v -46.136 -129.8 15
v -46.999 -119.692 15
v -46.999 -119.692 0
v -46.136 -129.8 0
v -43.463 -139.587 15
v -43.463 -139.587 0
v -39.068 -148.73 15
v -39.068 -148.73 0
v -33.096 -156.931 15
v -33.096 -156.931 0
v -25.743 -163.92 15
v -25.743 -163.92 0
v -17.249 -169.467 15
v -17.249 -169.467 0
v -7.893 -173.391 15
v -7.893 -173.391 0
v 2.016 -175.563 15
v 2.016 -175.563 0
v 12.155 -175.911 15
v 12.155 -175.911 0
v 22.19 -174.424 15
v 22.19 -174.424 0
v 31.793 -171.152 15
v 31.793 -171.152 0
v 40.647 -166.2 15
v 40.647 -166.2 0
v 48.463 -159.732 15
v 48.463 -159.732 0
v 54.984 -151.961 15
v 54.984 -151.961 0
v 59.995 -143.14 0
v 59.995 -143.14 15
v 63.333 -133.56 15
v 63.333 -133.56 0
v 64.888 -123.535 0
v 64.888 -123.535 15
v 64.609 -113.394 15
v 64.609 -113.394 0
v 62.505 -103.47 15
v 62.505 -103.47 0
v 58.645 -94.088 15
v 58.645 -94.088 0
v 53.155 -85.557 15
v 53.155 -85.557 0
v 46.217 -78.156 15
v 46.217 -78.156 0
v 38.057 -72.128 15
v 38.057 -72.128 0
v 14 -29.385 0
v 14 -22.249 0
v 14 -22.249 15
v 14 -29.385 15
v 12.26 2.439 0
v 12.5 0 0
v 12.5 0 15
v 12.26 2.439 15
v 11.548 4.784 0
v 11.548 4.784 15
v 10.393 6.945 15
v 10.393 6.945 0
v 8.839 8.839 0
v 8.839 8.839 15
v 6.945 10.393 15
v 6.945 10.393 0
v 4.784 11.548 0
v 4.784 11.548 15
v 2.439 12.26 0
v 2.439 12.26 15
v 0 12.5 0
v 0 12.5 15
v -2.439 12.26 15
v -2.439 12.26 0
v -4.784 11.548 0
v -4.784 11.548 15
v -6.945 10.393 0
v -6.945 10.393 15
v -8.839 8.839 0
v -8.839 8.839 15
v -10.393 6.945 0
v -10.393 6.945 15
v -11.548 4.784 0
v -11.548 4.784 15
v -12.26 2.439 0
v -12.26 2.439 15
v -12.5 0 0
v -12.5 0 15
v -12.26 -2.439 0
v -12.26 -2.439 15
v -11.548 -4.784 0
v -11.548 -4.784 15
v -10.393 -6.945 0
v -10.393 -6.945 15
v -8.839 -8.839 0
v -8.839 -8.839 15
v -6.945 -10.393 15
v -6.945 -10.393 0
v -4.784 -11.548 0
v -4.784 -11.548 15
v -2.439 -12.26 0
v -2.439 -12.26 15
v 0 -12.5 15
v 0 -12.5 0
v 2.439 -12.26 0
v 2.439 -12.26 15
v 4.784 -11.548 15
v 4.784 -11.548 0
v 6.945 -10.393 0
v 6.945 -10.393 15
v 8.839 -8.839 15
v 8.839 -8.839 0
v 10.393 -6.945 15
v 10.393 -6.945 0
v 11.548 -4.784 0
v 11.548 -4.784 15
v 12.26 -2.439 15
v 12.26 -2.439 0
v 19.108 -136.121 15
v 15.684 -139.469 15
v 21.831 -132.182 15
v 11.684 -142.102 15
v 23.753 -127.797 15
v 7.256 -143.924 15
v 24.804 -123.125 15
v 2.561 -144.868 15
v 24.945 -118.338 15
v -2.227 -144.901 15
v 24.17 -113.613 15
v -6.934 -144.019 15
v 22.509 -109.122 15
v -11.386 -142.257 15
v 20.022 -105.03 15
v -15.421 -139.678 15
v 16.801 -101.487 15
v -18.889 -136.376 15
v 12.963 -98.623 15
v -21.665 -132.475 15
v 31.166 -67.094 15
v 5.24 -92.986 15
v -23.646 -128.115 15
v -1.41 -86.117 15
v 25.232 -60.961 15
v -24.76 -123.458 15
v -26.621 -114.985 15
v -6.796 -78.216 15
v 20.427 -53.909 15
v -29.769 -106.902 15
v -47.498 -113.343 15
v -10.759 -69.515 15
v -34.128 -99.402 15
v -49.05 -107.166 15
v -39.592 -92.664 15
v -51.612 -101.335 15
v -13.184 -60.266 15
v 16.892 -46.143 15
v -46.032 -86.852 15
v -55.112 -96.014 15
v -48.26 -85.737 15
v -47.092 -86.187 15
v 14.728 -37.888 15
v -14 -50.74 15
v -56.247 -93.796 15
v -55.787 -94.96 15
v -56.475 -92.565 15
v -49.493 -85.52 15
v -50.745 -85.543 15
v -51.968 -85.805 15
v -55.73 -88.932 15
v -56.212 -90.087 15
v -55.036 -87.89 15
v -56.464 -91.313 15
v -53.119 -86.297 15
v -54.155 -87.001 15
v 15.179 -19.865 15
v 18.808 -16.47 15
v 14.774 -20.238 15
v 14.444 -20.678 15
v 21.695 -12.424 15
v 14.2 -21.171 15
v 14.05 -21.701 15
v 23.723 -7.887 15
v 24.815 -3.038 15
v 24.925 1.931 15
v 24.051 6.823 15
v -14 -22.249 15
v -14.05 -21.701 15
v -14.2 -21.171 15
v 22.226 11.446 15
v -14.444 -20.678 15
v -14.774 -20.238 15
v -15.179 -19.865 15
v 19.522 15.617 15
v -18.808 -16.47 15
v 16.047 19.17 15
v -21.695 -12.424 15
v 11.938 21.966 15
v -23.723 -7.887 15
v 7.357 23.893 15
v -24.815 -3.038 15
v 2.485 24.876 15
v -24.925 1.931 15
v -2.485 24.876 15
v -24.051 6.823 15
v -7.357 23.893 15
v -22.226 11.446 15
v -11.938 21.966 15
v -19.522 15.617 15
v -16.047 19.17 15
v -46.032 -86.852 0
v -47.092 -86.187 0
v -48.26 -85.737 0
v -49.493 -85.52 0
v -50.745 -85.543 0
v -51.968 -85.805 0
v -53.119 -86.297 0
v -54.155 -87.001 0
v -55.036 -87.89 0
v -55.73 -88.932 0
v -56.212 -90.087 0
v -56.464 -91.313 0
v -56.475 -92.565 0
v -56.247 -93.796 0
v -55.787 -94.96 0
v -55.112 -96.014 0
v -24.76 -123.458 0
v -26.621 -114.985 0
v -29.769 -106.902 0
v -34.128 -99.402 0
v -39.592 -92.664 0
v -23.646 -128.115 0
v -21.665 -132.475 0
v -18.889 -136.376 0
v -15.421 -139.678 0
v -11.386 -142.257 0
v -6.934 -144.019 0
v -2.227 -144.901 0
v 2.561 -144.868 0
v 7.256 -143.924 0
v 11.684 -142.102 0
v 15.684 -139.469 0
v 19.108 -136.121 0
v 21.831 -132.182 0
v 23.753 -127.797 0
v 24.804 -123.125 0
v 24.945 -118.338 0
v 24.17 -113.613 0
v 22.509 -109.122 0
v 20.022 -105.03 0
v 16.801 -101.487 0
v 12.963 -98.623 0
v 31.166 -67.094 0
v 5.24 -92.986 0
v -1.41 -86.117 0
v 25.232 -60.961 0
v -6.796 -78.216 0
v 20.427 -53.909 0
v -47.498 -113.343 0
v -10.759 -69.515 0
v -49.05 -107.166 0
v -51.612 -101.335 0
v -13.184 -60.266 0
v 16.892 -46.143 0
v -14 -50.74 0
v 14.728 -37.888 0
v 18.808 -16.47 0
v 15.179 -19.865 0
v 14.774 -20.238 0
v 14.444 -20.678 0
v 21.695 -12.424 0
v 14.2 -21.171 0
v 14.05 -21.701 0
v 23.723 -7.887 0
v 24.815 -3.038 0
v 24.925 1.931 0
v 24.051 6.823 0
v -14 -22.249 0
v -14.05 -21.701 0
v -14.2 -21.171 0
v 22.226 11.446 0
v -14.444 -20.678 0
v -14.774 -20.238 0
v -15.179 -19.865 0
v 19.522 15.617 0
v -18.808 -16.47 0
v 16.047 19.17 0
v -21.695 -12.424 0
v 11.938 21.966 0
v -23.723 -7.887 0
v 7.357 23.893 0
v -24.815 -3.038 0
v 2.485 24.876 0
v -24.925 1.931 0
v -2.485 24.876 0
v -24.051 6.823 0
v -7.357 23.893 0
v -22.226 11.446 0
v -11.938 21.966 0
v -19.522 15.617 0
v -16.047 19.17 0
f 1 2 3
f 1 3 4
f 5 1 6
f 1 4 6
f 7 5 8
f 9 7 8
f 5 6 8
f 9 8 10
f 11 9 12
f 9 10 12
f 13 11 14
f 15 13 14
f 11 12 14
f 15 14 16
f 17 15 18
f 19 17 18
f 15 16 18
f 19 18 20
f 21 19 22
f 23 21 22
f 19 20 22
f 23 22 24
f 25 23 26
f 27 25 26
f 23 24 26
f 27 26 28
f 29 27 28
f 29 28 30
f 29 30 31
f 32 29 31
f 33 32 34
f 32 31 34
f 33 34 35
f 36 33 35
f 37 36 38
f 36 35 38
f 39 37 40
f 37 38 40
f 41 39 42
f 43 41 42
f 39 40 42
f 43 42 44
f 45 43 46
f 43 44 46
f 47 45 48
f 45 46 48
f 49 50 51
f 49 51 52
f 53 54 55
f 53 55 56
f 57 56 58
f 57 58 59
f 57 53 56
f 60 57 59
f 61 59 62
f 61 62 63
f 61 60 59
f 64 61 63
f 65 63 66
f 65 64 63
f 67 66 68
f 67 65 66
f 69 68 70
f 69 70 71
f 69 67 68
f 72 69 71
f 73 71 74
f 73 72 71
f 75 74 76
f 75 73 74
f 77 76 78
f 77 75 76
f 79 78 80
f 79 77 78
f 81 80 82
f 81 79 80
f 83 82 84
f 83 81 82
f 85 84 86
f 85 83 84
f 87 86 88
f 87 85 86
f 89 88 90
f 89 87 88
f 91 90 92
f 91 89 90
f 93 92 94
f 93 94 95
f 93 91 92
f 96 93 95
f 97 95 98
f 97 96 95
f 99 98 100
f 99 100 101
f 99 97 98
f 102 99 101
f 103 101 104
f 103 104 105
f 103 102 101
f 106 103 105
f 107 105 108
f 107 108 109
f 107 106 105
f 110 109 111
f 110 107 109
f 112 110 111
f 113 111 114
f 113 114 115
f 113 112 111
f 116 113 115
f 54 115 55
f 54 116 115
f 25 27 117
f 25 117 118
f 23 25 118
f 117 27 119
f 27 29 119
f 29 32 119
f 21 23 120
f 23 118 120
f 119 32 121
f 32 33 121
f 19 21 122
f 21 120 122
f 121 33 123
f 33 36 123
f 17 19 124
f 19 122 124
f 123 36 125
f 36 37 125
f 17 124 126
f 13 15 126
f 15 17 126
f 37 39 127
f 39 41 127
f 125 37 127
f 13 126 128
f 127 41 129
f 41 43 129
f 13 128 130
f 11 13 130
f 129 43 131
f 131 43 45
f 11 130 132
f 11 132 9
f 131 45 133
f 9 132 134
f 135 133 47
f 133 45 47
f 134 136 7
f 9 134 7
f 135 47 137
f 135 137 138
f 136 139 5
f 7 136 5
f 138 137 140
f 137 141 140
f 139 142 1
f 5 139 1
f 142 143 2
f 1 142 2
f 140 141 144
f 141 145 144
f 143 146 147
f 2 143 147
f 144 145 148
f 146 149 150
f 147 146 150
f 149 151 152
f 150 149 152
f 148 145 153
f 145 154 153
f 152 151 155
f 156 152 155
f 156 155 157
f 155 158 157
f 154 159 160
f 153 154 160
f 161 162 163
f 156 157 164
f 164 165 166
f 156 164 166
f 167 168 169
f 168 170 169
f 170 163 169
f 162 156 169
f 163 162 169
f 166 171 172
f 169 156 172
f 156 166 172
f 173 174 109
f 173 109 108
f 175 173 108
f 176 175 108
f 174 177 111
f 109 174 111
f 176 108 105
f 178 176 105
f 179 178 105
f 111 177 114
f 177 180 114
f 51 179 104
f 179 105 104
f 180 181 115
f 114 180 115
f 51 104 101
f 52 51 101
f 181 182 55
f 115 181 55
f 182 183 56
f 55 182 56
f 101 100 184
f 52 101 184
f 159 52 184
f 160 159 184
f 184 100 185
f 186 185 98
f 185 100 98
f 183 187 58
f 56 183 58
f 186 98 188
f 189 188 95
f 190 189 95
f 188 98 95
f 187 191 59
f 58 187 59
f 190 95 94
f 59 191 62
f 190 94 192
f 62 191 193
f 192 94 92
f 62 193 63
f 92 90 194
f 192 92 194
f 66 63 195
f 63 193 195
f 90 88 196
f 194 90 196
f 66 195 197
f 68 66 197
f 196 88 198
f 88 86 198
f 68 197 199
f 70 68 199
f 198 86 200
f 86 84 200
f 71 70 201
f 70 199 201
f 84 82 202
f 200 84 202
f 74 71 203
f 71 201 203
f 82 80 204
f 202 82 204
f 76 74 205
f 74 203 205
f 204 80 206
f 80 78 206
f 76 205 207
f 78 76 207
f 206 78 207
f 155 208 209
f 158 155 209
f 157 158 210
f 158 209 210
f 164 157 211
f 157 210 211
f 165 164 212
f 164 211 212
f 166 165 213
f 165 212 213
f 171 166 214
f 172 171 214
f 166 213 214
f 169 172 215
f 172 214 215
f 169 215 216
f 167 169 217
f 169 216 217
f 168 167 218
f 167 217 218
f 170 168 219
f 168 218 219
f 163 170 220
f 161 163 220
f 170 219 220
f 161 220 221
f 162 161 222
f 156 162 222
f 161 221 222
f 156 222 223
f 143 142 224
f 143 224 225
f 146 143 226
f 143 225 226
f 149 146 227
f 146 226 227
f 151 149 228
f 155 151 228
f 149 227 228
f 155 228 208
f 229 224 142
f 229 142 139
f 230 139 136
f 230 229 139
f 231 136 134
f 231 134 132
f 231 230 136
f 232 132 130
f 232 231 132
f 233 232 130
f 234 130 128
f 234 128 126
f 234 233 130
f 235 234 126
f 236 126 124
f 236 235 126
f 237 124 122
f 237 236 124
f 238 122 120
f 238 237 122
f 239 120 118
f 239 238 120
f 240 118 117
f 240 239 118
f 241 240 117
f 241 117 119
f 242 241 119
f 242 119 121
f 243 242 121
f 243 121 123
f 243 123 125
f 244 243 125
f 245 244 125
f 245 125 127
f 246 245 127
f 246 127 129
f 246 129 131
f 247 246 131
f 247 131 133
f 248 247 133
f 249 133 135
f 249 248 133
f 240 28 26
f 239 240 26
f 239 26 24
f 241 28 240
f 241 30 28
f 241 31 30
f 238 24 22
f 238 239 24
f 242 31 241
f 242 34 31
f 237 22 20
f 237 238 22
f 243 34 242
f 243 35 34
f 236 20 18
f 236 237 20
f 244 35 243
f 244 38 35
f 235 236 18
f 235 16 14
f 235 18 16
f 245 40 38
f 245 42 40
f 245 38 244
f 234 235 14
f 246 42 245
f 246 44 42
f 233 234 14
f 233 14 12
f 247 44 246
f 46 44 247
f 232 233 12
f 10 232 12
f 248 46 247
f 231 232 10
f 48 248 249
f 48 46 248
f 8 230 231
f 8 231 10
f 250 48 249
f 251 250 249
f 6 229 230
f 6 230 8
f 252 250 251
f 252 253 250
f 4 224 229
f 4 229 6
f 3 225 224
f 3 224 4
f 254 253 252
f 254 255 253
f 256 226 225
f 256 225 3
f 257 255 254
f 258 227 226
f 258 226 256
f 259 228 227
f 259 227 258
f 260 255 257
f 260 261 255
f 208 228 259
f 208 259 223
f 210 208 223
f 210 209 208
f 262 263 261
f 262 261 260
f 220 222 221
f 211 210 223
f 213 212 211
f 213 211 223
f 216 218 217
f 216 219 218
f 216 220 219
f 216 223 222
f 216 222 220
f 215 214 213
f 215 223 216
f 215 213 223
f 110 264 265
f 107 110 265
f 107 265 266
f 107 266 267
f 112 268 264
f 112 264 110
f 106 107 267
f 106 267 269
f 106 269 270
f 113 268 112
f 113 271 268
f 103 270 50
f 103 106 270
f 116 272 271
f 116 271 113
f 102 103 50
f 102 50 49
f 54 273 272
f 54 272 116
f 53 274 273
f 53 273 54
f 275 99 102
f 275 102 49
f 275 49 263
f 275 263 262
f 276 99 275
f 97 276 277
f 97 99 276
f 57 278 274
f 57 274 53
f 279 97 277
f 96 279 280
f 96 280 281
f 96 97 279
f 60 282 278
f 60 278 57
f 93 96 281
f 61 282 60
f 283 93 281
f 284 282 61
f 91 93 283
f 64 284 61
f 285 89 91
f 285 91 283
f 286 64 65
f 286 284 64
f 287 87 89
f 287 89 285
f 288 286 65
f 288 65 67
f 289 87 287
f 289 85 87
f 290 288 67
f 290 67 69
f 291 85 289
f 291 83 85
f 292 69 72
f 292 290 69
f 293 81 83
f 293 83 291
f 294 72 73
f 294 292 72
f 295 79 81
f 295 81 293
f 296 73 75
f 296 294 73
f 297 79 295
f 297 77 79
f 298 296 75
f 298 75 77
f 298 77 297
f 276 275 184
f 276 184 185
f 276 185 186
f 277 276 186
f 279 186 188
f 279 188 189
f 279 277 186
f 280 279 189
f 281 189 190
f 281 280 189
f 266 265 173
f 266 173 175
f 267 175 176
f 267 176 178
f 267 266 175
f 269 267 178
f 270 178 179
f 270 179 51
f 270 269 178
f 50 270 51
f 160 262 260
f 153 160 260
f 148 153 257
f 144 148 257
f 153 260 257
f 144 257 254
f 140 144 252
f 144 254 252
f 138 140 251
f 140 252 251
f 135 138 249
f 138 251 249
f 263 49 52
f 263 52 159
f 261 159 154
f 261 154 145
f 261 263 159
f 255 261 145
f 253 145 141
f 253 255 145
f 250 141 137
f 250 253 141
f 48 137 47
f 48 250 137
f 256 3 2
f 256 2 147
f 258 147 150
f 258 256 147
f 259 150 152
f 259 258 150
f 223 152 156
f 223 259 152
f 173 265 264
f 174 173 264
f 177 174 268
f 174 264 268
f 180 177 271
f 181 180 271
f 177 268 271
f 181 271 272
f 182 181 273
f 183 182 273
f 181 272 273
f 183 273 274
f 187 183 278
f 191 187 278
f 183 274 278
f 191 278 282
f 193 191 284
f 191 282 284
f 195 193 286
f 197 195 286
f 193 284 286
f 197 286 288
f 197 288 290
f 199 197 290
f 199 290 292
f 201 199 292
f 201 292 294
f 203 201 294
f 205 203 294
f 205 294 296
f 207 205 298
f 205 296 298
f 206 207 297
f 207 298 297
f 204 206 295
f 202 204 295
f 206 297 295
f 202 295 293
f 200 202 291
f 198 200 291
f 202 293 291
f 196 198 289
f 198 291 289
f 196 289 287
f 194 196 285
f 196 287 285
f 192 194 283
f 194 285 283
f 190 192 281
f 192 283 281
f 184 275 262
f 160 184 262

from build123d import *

# Parameters (mm, degrees)
SKETCH_R  = 12.5
PAD_DEPTH = 15


with BuildPart() as part:
    # Sketch → Pad (new body)
    with BuildSketch(Plane.XY):
        with BuildLine():
            ThreePointArc((-24.759708, -123.457867), (13.746972, -140.88111), (12.962963, -98.62334))
            ThreePointArc((-14, -50.739622), (-6.795871, -78.216211), (12.962963, -98.62334))
            Line((-14, -22.248595), (-14, -50.739622))
            ThreePointArc((-14, -22.248595), (-14.310736, -20.918988), (-15.178571, -19.864817))
            ThreePointArc((15.178571, -19.864817), (0, 25), (-15.178571, -19.864817))
            ThreePointArc((15.178571, -19.864817), (14.310736, -20.918988), (14, -22.248595))
            Line((14, -22.248595), (14, -29.385432))
            ThreePointArc((14, -29.385432), (20.427246, -53.909198), (38.056604, -72.128153))
            ThreePointArc((-46.999155, -119.692368), (36.33247, -168.876744), (38.056604, -72.128153))
            ThreePointArc((-46.999155, -119.692368), (-49.050241, -107.16628), (-55.112152, -96.014461))
            ThreePointArc((-46.031526, -86.852067), (-54.616749, -87.424453), (-55.112152, -96.014461))
            ThreePointArc((-24.759708, -123.457867), (-31.802947, -103.067248), (-46.031526, -86.852067))
        make_face()
        Circle(SKETCH_R, mode=Mode.SUBTRACT)
    extrude(amount=PAD_DEPTH)


solid = part.part
